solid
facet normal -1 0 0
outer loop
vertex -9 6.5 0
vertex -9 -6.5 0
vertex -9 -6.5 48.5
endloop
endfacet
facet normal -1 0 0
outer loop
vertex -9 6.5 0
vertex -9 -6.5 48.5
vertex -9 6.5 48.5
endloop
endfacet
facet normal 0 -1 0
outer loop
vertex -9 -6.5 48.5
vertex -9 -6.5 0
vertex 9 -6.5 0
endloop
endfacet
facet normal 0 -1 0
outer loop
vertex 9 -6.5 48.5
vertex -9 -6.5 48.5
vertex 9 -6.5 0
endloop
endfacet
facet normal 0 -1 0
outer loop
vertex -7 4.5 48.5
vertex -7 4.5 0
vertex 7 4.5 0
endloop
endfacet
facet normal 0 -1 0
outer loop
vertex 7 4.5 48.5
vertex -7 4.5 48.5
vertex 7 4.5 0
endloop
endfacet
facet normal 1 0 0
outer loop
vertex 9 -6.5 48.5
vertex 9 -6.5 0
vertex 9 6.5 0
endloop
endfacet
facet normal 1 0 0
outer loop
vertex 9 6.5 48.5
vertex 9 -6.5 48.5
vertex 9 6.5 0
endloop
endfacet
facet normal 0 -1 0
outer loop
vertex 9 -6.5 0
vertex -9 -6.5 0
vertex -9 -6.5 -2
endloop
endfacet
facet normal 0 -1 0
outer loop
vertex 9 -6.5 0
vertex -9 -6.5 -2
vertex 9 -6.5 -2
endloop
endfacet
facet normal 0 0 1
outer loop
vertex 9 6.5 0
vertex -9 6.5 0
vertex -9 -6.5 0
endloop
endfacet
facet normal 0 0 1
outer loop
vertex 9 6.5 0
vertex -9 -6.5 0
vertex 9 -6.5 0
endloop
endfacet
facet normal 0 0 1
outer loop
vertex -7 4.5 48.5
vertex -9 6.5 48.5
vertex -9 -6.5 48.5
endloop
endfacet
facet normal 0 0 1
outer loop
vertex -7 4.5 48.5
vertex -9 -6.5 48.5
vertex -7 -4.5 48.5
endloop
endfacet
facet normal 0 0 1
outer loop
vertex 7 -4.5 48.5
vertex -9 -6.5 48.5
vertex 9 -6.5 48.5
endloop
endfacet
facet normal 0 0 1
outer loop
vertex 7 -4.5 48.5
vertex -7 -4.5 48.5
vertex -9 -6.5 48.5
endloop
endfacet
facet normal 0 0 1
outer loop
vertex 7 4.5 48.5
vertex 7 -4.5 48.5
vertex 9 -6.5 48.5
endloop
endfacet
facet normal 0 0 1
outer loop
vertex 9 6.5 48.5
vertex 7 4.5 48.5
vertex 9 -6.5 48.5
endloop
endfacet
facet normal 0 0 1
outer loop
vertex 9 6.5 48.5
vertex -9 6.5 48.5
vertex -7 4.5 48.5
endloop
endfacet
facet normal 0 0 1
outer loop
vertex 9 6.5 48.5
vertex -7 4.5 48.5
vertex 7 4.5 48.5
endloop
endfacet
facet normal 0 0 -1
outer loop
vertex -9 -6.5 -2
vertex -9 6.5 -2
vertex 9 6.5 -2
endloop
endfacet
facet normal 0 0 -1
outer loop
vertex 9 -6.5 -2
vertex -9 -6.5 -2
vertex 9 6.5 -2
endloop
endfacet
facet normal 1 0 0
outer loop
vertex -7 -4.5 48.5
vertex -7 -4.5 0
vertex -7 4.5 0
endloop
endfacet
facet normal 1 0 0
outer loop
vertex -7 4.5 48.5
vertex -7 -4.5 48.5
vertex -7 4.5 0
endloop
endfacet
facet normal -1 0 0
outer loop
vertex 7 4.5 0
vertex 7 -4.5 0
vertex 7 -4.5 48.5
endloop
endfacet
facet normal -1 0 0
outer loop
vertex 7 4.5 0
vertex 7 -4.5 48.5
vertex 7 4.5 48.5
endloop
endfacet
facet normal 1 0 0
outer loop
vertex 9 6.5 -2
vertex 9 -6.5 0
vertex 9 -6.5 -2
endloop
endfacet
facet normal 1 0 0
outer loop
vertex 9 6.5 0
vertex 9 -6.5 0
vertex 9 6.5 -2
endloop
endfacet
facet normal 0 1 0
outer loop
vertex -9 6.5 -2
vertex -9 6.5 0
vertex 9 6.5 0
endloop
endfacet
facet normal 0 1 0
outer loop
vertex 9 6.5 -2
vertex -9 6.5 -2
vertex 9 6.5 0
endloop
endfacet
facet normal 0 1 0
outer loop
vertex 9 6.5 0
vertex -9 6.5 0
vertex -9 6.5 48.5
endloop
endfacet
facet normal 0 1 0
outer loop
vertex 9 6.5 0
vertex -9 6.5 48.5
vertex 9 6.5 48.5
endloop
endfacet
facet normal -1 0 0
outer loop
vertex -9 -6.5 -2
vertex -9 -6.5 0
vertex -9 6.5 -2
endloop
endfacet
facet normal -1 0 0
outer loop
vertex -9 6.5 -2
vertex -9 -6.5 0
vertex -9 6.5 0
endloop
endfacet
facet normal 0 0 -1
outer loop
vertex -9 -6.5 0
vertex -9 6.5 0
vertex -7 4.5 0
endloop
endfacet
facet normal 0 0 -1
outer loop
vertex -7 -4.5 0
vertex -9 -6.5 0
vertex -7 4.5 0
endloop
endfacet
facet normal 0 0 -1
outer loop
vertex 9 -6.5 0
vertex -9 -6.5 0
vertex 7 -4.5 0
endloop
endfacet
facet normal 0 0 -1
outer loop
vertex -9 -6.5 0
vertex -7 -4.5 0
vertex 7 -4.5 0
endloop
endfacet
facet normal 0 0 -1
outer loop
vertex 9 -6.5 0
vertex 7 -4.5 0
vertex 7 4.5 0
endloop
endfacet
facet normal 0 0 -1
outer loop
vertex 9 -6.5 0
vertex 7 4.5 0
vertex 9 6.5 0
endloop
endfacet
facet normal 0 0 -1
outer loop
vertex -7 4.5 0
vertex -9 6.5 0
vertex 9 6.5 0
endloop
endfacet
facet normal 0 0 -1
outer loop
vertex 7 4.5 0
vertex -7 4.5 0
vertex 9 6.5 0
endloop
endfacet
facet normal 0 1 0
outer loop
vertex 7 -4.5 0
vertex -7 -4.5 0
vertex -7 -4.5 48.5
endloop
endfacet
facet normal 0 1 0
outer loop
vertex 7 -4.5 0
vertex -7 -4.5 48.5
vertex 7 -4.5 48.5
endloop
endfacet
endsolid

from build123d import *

# Parameters (mm, degrees)
F0_W     = 18
F0_H     = 13
F0_W_2   = 14
F0_H_2   = 9
F1_DEPTH = 48.5
F2_DEPTH = 2


with BuildPart() as f1:
    # F0 (on Top) → F1 (new body)
    with BuildSketch(Plane.XY):
        Rectangle(F0_W, F0_H)
        Rectangle(F0_W_2, F0_H_2, mode=Mode.SUBTRACT)
    extrude(amount=F1_DEPTH)


with BuildPart() as f2:
    # F0 (on Top) → F2 (new body)
    with BuildSketch(Plane.XY):
        Rectangle(F0_W, F0_H)
        Rectangle(F0_W_2, F0_H_2, mode=Mode.SUBTRACT)
        Rectangle(F0_W_2, F0_H_2)
    extrude(amount=-F2_DEPTH)


solid = Compound([f1.part, f2.part])
